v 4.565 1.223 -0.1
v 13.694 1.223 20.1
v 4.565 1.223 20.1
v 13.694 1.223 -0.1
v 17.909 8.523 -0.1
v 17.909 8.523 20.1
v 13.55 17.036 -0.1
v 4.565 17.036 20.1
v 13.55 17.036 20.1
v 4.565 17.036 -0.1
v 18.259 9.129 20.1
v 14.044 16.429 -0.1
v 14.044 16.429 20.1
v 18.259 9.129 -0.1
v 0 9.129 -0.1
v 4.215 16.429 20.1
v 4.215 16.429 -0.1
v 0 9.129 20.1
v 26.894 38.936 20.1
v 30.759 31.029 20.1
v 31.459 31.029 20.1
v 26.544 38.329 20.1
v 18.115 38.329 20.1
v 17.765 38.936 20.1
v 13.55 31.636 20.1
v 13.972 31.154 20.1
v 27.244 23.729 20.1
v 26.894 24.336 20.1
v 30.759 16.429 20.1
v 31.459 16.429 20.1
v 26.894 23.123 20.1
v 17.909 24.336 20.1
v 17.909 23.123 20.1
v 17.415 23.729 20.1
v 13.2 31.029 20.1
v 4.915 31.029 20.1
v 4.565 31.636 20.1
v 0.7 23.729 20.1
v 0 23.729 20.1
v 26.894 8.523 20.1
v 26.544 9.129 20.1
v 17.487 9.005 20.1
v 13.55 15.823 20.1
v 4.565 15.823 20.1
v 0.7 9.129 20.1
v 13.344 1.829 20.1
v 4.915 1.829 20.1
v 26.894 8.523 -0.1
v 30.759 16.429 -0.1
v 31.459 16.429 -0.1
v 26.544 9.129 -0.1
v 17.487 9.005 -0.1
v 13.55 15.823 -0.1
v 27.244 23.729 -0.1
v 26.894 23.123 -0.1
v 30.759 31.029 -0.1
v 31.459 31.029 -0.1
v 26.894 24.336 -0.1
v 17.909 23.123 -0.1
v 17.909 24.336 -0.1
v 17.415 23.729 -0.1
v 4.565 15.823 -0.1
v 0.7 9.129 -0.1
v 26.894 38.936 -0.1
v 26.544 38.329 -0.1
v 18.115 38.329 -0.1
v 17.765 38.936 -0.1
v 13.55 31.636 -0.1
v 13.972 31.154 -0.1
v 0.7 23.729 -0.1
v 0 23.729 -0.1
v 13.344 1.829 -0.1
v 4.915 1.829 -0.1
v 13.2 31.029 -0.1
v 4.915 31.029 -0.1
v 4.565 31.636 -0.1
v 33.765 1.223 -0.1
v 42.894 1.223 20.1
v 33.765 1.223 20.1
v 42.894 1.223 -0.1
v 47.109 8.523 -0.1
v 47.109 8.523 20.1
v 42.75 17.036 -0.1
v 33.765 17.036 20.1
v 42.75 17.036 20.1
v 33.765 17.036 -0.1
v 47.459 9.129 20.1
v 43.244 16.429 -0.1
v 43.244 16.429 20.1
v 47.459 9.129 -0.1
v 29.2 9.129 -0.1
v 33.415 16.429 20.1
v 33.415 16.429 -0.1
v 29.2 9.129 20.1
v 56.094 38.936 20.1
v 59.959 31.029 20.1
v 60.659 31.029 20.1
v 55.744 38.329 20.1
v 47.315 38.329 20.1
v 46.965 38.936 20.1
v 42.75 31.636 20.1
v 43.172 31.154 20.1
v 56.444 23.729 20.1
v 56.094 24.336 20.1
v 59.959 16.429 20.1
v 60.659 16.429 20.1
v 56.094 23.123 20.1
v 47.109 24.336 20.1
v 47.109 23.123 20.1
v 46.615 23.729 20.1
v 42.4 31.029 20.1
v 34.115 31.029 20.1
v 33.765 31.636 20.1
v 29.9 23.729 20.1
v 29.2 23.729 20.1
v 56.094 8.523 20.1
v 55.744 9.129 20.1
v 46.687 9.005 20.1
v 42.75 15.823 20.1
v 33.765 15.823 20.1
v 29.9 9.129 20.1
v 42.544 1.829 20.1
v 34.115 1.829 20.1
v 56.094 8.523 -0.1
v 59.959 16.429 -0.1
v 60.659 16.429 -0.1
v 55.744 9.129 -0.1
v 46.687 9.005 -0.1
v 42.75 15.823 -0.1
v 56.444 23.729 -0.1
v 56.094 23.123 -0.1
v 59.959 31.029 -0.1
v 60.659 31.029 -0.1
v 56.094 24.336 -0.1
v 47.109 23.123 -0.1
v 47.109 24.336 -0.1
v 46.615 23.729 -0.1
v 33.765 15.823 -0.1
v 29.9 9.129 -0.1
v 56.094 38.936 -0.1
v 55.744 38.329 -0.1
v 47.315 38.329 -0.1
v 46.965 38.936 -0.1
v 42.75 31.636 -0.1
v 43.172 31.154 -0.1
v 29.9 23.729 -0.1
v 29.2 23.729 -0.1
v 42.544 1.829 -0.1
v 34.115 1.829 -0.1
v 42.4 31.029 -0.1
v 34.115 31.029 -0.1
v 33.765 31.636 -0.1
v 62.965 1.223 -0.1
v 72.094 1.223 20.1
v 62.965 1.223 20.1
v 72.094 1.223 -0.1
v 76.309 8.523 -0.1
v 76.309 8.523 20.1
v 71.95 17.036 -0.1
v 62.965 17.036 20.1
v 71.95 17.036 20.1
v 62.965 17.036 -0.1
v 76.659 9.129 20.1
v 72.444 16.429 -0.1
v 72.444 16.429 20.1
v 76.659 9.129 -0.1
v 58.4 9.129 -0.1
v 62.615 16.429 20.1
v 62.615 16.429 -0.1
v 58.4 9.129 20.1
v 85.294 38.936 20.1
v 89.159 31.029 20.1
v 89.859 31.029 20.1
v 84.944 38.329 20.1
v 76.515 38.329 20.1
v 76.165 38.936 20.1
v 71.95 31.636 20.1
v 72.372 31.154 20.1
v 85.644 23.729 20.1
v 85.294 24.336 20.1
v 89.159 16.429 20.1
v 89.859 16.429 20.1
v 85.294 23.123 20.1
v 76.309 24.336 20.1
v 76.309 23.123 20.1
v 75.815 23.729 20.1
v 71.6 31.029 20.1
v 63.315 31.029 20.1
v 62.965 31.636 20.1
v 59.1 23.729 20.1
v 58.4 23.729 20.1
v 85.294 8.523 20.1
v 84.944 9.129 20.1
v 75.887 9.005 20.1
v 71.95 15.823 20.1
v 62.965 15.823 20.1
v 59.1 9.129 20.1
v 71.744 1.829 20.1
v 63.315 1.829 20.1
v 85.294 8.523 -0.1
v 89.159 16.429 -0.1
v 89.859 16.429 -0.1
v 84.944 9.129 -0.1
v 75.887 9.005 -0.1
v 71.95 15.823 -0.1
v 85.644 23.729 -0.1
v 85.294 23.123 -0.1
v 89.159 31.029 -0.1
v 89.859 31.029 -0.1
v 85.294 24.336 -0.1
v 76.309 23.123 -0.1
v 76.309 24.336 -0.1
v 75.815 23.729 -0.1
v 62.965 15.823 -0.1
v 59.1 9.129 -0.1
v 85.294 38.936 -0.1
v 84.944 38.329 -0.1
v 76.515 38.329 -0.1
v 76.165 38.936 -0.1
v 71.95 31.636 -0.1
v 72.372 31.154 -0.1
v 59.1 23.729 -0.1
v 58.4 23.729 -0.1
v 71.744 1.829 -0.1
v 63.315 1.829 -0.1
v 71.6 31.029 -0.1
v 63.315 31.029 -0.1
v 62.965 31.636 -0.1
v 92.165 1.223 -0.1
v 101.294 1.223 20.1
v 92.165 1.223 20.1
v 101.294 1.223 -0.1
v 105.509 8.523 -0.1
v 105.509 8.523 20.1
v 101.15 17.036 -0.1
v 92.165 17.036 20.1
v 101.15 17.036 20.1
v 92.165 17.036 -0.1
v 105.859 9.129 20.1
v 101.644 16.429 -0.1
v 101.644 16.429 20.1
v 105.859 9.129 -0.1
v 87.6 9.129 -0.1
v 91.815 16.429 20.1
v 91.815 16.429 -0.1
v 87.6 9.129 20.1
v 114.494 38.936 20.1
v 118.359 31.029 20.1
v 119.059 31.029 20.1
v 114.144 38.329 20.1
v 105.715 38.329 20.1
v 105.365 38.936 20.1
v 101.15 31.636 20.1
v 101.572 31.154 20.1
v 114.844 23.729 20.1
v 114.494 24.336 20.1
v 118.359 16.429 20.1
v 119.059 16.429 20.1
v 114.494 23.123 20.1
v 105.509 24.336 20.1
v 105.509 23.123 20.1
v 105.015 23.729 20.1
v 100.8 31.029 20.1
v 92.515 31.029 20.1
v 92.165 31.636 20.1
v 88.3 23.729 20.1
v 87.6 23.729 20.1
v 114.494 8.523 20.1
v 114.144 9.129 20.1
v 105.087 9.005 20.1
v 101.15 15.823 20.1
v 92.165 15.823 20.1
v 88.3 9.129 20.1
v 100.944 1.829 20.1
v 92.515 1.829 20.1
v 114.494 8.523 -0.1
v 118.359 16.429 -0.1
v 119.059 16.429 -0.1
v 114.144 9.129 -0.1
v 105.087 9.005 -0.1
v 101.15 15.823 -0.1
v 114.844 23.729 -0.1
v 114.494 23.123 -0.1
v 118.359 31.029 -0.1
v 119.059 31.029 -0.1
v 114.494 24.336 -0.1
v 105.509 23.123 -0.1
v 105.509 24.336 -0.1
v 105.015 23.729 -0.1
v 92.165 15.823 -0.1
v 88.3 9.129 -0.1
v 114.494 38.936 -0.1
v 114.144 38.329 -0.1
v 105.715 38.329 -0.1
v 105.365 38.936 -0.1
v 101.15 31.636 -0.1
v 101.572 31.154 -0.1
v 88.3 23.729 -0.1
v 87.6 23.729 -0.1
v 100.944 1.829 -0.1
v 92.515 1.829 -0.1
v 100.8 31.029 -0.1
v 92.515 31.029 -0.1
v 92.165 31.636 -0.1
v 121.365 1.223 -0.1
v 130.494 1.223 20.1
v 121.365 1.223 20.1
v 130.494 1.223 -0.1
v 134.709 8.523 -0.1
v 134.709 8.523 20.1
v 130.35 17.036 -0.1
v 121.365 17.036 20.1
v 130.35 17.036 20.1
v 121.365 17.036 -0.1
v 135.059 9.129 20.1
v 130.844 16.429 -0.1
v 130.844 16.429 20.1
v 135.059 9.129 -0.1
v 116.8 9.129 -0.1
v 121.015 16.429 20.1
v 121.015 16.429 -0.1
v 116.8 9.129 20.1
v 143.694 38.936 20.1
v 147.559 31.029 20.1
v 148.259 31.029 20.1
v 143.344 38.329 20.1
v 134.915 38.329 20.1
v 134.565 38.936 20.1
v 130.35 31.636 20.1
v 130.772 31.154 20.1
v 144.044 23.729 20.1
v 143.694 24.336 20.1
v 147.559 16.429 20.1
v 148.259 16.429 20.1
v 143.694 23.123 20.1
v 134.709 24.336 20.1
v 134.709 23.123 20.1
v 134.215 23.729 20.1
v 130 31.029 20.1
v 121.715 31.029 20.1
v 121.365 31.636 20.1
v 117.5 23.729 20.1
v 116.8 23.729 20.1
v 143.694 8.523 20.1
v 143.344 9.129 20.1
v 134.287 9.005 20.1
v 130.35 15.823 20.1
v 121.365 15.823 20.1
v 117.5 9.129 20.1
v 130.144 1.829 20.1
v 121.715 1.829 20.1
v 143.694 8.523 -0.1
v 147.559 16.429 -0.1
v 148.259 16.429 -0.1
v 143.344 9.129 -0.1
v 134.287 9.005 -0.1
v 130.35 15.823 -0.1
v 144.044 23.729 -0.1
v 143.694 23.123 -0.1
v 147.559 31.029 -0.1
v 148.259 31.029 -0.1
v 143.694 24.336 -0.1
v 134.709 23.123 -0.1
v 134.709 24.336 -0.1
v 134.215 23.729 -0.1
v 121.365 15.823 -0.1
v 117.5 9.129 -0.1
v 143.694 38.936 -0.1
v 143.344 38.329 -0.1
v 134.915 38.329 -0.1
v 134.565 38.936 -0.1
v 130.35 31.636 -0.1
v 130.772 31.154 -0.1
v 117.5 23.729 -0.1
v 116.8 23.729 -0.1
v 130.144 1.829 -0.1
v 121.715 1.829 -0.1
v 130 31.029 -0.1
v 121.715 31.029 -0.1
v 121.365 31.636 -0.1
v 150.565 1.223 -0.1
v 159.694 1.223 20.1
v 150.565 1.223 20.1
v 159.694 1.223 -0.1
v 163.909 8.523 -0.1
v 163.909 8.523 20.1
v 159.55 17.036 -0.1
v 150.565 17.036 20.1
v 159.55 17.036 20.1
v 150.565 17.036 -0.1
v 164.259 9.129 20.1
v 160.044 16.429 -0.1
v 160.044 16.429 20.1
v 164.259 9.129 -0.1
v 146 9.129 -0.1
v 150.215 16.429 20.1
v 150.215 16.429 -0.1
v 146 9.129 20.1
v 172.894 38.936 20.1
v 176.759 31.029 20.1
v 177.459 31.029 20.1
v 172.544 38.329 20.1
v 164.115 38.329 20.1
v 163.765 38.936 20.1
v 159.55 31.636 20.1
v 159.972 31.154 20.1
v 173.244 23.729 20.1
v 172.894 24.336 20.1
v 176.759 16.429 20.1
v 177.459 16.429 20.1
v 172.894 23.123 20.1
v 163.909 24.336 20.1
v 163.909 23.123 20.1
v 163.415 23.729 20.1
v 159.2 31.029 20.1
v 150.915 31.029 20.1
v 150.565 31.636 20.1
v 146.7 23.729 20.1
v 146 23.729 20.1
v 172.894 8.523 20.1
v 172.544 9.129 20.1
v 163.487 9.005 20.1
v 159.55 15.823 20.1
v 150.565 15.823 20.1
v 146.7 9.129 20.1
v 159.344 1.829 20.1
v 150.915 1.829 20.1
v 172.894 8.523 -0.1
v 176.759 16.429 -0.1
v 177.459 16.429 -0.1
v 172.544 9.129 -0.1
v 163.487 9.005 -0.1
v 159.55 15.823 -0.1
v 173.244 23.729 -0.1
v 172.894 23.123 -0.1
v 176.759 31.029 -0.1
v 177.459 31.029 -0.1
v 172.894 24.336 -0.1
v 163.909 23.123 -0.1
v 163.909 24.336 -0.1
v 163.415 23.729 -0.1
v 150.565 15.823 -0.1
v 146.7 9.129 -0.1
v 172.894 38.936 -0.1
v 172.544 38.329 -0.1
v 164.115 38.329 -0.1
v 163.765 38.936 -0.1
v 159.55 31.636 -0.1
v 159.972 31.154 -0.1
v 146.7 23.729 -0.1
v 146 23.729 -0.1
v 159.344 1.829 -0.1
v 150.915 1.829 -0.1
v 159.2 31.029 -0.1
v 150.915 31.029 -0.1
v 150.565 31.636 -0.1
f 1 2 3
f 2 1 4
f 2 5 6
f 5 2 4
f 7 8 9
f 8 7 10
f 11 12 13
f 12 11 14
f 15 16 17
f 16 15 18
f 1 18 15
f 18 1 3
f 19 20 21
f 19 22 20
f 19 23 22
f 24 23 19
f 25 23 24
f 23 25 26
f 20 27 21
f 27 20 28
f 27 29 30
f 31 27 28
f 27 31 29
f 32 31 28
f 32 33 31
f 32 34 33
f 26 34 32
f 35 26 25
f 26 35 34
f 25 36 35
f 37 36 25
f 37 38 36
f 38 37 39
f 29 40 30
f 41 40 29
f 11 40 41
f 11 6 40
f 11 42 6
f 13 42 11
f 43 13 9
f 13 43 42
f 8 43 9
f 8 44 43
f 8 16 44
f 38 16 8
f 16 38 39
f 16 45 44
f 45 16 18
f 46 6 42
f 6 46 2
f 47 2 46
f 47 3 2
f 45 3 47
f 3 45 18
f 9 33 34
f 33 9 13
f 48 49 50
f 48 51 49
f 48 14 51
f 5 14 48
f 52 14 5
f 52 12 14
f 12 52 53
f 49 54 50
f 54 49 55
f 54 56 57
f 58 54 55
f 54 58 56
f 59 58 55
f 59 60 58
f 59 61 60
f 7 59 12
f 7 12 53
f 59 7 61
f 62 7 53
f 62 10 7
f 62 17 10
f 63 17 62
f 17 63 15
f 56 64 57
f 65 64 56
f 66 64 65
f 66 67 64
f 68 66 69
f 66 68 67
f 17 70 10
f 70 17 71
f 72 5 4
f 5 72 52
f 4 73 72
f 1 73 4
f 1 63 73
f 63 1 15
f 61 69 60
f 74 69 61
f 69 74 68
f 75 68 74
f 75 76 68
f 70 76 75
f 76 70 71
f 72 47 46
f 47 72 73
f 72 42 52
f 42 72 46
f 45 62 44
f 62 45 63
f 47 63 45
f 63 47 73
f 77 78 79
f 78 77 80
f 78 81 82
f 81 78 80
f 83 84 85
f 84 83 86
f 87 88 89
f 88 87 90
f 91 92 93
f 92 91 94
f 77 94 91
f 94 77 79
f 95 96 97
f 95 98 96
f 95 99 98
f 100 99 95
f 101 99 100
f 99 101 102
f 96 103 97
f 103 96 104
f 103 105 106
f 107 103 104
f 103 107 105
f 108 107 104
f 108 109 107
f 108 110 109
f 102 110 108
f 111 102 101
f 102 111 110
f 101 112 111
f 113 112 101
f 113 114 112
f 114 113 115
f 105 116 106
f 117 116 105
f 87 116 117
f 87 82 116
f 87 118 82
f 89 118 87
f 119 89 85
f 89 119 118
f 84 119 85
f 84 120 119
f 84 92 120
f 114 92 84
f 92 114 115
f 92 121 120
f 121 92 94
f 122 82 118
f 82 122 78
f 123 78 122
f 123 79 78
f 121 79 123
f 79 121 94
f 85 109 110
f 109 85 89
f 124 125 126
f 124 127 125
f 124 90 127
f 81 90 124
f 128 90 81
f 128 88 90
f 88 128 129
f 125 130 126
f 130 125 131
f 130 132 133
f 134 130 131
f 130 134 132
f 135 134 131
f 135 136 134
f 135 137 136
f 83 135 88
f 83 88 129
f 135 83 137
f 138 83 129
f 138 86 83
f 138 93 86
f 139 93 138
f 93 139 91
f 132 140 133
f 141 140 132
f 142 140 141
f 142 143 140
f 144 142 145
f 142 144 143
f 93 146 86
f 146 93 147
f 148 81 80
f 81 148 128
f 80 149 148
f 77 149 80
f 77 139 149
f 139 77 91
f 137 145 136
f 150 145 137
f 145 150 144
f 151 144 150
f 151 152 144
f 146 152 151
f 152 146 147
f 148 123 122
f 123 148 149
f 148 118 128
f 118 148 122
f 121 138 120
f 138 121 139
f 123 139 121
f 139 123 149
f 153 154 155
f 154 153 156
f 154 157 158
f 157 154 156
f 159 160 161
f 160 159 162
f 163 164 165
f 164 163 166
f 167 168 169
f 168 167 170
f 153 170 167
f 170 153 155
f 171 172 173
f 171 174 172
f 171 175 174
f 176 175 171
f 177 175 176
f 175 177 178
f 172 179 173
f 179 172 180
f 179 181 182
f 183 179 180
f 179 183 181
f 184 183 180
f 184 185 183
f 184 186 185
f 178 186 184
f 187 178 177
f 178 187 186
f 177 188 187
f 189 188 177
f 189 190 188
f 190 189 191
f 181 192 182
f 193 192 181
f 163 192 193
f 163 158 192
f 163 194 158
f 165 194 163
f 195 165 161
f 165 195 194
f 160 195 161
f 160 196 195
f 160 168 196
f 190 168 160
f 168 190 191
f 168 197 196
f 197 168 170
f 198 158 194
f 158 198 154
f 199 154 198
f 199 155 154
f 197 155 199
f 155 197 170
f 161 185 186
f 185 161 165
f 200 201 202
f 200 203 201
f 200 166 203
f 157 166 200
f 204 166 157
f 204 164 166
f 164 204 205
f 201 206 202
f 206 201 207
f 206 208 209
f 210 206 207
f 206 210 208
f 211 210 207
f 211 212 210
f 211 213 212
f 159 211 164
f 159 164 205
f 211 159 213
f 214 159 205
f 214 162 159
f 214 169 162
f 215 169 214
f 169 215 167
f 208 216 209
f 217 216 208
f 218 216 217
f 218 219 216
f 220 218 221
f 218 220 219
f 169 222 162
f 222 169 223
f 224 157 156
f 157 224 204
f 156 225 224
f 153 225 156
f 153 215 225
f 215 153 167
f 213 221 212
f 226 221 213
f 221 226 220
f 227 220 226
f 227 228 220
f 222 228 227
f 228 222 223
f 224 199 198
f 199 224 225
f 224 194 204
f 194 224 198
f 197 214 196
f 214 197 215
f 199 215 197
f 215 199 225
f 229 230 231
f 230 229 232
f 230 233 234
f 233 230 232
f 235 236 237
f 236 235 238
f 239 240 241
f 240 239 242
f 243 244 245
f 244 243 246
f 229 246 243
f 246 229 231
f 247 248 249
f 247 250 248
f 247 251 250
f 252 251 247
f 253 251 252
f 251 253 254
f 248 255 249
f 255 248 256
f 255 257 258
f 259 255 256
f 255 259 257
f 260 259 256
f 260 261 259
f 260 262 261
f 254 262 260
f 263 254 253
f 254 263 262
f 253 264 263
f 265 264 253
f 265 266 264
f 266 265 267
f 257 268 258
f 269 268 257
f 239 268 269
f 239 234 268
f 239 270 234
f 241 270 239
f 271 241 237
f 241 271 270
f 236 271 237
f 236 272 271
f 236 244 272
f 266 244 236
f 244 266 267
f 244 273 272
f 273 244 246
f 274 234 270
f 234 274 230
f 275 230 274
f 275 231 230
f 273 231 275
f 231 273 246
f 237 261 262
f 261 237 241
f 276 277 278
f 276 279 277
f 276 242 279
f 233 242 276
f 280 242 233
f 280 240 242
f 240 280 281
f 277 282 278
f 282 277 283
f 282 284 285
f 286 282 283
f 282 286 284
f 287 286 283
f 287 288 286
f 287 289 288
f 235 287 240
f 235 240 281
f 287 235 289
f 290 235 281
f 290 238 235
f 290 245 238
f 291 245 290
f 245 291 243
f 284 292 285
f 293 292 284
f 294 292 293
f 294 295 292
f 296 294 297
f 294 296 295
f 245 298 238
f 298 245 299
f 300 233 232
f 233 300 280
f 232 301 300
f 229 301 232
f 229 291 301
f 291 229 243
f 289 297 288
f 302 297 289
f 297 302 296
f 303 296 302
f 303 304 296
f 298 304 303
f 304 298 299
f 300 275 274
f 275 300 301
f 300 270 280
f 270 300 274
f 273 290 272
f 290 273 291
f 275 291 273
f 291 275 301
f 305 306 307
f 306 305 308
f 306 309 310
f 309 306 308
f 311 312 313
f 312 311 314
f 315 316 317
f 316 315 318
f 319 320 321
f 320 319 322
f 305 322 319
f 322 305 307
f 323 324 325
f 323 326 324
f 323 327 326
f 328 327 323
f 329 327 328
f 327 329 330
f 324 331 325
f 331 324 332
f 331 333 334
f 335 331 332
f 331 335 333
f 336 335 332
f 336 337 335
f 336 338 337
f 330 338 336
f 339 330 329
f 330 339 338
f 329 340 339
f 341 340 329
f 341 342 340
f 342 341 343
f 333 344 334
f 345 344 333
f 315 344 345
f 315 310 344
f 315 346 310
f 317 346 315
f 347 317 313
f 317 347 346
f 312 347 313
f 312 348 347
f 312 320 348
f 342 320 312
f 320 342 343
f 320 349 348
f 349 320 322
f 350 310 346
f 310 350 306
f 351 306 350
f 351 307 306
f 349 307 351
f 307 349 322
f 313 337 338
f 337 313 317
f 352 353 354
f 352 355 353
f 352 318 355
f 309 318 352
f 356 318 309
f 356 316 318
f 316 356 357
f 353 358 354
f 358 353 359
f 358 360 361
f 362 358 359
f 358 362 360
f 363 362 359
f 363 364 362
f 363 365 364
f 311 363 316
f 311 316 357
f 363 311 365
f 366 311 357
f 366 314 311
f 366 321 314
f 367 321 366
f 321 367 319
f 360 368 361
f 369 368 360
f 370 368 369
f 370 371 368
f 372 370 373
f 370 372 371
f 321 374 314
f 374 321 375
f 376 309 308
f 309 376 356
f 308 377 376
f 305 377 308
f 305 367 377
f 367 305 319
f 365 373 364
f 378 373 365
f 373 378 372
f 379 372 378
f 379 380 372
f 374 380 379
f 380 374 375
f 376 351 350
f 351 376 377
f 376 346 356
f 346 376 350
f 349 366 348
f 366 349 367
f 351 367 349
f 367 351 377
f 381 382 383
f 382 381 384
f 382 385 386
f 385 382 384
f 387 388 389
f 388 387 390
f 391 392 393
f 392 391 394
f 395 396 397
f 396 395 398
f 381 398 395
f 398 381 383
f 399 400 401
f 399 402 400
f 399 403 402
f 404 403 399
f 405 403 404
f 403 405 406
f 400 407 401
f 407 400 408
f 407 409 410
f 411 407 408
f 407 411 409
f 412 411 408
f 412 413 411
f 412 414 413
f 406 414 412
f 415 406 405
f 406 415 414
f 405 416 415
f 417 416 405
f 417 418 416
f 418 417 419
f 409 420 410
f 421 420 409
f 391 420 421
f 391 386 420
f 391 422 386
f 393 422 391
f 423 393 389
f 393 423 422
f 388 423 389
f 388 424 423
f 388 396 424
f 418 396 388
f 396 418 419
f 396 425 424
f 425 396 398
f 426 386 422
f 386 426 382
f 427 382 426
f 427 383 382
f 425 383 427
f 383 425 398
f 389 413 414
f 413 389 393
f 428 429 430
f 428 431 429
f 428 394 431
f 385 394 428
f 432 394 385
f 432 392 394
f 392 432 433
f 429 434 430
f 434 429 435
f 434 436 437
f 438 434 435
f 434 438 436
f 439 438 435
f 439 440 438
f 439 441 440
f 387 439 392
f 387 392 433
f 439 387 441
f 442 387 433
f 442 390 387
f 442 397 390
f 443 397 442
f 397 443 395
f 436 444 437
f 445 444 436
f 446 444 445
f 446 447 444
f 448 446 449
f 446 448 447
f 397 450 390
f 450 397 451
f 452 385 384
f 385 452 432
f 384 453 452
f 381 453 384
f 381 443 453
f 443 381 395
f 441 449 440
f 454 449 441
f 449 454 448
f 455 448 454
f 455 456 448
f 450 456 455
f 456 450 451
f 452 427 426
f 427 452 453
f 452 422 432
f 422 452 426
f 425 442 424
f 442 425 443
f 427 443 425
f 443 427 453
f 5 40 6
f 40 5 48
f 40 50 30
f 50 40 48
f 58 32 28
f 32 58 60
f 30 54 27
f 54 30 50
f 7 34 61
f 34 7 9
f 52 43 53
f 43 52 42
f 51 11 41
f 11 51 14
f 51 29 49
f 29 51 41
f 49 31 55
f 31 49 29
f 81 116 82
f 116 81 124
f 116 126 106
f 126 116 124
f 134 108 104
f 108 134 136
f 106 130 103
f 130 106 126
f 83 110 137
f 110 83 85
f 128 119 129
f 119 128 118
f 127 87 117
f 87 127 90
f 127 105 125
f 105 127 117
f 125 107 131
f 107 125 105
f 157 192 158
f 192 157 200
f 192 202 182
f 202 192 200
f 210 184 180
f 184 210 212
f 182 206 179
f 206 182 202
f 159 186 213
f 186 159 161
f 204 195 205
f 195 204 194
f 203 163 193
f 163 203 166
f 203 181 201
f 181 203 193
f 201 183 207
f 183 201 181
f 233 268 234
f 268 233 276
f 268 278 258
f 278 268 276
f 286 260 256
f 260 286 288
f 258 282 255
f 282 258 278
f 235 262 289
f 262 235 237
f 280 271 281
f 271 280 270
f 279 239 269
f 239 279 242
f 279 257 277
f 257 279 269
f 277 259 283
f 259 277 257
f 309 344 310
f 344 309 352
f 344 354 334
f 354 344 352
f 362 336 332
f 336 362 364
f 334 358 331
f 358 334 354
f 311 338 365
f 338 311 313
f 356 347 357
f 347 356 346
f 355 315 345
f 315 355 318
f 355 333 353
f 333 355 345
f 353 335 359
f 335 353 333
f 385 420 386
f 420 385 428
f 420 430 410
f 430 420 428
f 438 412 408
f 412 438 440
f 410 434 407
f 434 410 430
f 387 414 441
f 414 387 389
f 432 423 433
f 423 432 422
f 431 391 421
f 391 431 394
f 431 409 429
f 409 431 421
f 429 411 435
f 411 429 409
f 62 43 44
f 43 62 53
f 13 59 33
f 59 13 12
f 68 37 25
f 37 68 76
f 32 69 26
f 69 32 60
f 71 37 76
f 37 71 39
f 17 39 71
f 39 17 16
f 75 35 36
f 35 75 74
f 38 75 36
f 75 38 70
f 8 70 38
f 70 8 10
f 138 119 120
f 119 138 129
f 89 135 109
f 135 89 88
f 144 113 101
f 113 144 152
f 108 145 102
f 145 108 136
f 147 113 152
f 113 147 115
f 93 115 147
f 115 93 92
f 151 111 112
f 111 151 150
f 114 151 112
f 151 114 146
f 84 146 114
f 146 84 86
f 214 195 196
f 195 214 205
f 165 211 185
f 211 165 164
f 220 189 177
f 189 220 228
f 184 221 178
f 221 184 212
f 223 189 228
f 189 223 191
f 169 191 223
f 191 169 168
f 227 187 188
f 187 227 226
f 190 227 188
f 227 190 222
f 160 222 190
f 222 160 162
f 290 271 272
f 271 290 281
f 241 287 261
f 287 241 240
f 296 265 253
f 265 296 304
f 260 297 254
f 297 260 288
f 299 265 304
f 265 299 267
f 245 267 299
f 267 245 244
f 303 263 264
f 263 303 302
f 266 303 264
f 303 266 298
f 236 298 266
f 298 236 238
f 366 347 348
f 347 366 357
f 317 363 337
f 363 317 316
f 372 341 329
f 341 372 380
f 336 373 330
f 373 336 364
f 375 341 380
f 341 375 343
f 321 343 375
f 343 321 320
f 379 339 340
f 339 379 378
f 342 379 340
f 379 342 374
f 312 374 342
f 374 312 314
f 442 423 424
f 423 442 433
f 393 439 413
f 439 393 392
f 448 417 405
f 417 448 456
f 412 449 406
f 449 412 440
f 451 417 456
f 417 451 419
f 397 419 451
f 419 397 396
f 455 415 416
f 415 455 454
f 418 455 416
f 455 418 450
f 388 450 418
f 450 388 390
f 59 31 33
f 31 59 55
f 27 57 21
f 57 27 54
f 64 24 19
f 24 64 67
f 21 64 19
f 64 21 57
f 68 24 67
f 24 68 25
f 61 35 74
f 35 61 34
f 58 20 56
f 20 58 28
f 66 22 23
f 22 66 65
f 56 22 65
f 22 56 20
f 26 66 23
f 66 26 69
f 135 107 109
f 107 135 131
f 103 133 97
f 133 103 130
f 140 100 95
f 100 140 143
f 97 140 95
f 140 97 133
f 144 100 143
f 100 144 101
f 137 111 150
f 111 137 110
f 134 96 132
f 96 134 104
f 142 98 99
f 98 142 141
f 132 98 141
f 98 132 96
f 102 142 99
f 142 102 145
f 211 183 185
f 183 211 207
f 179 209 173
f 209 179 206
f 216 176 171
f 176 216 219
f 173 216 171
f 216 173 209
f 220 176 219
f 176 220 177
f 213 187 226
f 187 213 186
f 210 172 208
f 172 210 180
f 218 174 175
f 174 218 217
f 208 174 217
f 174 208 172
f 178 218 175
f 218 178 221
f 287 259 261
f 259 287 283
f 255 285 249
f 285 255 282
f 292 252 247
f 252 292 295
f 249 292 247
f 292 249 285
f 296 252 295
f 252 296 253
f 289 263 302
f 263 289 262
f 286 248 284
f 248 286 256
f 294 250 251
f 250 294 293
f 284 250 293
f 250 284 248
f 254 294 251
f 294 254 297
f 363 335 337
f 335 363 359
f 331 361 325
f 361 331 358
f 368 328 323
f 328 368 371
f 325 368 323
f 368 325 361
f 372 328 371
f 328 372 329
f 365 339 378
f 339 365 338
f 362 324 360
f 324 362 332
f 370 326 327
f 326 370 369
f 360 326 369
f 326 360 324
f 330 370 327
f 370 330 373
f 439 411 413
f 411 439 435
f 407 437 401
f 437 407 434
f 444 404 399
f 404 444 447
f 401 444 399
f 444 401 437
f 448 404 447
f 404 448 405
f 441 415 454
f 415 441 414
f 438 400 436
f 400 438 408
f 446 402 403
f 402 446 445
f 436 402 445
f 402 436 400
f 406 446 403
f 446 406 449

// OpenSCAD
// created by AkytharPandaaa
// encoding: utf-8

/* tolerance:
  0.1 tight fit
  0.15 fits
  0.2 loose fit */

$fn = $preview ? 25 : 125;

module grid(width, depth, a=2, height = 20, grid_thickness=.7, floor_thickness = .5, border_thickness = 3) {
  diameter = [0,14.5, 10.5];
  bat_od = diameter[a-1] + .1;
  hex_od = bat_od / cos(30);
  bat_offset = (bat_od) / 2;

  translate(v = [hex_od/2+grid_thickness, hex_od/2+grid_thickness, 0]) {
    for (y=[0:depth-1]) {
      for (x=[0:width-1]) {
        translate(v = [
          (bat_od) * x * 2 + ((bat_od - grid_thickness * 2) * (y%2)),
          (bat_od/2)*y,
          0
        ]) {
            translate(v = [0,0,height/2]) difference() {
              cylinder(h = height+.2, r = hex_od/2+grid_thickness, center = true, $fn = 6);
              cylinder(h = height+.4, r = hex_od/2, center = true, $fn = 6);
            }
        }
      }
    }
  }
}

grid(width = 6, depth = 4, a = 2);
//translate(v = [100,0,0]) grid(width = 6, depth = 4, a = 3);
